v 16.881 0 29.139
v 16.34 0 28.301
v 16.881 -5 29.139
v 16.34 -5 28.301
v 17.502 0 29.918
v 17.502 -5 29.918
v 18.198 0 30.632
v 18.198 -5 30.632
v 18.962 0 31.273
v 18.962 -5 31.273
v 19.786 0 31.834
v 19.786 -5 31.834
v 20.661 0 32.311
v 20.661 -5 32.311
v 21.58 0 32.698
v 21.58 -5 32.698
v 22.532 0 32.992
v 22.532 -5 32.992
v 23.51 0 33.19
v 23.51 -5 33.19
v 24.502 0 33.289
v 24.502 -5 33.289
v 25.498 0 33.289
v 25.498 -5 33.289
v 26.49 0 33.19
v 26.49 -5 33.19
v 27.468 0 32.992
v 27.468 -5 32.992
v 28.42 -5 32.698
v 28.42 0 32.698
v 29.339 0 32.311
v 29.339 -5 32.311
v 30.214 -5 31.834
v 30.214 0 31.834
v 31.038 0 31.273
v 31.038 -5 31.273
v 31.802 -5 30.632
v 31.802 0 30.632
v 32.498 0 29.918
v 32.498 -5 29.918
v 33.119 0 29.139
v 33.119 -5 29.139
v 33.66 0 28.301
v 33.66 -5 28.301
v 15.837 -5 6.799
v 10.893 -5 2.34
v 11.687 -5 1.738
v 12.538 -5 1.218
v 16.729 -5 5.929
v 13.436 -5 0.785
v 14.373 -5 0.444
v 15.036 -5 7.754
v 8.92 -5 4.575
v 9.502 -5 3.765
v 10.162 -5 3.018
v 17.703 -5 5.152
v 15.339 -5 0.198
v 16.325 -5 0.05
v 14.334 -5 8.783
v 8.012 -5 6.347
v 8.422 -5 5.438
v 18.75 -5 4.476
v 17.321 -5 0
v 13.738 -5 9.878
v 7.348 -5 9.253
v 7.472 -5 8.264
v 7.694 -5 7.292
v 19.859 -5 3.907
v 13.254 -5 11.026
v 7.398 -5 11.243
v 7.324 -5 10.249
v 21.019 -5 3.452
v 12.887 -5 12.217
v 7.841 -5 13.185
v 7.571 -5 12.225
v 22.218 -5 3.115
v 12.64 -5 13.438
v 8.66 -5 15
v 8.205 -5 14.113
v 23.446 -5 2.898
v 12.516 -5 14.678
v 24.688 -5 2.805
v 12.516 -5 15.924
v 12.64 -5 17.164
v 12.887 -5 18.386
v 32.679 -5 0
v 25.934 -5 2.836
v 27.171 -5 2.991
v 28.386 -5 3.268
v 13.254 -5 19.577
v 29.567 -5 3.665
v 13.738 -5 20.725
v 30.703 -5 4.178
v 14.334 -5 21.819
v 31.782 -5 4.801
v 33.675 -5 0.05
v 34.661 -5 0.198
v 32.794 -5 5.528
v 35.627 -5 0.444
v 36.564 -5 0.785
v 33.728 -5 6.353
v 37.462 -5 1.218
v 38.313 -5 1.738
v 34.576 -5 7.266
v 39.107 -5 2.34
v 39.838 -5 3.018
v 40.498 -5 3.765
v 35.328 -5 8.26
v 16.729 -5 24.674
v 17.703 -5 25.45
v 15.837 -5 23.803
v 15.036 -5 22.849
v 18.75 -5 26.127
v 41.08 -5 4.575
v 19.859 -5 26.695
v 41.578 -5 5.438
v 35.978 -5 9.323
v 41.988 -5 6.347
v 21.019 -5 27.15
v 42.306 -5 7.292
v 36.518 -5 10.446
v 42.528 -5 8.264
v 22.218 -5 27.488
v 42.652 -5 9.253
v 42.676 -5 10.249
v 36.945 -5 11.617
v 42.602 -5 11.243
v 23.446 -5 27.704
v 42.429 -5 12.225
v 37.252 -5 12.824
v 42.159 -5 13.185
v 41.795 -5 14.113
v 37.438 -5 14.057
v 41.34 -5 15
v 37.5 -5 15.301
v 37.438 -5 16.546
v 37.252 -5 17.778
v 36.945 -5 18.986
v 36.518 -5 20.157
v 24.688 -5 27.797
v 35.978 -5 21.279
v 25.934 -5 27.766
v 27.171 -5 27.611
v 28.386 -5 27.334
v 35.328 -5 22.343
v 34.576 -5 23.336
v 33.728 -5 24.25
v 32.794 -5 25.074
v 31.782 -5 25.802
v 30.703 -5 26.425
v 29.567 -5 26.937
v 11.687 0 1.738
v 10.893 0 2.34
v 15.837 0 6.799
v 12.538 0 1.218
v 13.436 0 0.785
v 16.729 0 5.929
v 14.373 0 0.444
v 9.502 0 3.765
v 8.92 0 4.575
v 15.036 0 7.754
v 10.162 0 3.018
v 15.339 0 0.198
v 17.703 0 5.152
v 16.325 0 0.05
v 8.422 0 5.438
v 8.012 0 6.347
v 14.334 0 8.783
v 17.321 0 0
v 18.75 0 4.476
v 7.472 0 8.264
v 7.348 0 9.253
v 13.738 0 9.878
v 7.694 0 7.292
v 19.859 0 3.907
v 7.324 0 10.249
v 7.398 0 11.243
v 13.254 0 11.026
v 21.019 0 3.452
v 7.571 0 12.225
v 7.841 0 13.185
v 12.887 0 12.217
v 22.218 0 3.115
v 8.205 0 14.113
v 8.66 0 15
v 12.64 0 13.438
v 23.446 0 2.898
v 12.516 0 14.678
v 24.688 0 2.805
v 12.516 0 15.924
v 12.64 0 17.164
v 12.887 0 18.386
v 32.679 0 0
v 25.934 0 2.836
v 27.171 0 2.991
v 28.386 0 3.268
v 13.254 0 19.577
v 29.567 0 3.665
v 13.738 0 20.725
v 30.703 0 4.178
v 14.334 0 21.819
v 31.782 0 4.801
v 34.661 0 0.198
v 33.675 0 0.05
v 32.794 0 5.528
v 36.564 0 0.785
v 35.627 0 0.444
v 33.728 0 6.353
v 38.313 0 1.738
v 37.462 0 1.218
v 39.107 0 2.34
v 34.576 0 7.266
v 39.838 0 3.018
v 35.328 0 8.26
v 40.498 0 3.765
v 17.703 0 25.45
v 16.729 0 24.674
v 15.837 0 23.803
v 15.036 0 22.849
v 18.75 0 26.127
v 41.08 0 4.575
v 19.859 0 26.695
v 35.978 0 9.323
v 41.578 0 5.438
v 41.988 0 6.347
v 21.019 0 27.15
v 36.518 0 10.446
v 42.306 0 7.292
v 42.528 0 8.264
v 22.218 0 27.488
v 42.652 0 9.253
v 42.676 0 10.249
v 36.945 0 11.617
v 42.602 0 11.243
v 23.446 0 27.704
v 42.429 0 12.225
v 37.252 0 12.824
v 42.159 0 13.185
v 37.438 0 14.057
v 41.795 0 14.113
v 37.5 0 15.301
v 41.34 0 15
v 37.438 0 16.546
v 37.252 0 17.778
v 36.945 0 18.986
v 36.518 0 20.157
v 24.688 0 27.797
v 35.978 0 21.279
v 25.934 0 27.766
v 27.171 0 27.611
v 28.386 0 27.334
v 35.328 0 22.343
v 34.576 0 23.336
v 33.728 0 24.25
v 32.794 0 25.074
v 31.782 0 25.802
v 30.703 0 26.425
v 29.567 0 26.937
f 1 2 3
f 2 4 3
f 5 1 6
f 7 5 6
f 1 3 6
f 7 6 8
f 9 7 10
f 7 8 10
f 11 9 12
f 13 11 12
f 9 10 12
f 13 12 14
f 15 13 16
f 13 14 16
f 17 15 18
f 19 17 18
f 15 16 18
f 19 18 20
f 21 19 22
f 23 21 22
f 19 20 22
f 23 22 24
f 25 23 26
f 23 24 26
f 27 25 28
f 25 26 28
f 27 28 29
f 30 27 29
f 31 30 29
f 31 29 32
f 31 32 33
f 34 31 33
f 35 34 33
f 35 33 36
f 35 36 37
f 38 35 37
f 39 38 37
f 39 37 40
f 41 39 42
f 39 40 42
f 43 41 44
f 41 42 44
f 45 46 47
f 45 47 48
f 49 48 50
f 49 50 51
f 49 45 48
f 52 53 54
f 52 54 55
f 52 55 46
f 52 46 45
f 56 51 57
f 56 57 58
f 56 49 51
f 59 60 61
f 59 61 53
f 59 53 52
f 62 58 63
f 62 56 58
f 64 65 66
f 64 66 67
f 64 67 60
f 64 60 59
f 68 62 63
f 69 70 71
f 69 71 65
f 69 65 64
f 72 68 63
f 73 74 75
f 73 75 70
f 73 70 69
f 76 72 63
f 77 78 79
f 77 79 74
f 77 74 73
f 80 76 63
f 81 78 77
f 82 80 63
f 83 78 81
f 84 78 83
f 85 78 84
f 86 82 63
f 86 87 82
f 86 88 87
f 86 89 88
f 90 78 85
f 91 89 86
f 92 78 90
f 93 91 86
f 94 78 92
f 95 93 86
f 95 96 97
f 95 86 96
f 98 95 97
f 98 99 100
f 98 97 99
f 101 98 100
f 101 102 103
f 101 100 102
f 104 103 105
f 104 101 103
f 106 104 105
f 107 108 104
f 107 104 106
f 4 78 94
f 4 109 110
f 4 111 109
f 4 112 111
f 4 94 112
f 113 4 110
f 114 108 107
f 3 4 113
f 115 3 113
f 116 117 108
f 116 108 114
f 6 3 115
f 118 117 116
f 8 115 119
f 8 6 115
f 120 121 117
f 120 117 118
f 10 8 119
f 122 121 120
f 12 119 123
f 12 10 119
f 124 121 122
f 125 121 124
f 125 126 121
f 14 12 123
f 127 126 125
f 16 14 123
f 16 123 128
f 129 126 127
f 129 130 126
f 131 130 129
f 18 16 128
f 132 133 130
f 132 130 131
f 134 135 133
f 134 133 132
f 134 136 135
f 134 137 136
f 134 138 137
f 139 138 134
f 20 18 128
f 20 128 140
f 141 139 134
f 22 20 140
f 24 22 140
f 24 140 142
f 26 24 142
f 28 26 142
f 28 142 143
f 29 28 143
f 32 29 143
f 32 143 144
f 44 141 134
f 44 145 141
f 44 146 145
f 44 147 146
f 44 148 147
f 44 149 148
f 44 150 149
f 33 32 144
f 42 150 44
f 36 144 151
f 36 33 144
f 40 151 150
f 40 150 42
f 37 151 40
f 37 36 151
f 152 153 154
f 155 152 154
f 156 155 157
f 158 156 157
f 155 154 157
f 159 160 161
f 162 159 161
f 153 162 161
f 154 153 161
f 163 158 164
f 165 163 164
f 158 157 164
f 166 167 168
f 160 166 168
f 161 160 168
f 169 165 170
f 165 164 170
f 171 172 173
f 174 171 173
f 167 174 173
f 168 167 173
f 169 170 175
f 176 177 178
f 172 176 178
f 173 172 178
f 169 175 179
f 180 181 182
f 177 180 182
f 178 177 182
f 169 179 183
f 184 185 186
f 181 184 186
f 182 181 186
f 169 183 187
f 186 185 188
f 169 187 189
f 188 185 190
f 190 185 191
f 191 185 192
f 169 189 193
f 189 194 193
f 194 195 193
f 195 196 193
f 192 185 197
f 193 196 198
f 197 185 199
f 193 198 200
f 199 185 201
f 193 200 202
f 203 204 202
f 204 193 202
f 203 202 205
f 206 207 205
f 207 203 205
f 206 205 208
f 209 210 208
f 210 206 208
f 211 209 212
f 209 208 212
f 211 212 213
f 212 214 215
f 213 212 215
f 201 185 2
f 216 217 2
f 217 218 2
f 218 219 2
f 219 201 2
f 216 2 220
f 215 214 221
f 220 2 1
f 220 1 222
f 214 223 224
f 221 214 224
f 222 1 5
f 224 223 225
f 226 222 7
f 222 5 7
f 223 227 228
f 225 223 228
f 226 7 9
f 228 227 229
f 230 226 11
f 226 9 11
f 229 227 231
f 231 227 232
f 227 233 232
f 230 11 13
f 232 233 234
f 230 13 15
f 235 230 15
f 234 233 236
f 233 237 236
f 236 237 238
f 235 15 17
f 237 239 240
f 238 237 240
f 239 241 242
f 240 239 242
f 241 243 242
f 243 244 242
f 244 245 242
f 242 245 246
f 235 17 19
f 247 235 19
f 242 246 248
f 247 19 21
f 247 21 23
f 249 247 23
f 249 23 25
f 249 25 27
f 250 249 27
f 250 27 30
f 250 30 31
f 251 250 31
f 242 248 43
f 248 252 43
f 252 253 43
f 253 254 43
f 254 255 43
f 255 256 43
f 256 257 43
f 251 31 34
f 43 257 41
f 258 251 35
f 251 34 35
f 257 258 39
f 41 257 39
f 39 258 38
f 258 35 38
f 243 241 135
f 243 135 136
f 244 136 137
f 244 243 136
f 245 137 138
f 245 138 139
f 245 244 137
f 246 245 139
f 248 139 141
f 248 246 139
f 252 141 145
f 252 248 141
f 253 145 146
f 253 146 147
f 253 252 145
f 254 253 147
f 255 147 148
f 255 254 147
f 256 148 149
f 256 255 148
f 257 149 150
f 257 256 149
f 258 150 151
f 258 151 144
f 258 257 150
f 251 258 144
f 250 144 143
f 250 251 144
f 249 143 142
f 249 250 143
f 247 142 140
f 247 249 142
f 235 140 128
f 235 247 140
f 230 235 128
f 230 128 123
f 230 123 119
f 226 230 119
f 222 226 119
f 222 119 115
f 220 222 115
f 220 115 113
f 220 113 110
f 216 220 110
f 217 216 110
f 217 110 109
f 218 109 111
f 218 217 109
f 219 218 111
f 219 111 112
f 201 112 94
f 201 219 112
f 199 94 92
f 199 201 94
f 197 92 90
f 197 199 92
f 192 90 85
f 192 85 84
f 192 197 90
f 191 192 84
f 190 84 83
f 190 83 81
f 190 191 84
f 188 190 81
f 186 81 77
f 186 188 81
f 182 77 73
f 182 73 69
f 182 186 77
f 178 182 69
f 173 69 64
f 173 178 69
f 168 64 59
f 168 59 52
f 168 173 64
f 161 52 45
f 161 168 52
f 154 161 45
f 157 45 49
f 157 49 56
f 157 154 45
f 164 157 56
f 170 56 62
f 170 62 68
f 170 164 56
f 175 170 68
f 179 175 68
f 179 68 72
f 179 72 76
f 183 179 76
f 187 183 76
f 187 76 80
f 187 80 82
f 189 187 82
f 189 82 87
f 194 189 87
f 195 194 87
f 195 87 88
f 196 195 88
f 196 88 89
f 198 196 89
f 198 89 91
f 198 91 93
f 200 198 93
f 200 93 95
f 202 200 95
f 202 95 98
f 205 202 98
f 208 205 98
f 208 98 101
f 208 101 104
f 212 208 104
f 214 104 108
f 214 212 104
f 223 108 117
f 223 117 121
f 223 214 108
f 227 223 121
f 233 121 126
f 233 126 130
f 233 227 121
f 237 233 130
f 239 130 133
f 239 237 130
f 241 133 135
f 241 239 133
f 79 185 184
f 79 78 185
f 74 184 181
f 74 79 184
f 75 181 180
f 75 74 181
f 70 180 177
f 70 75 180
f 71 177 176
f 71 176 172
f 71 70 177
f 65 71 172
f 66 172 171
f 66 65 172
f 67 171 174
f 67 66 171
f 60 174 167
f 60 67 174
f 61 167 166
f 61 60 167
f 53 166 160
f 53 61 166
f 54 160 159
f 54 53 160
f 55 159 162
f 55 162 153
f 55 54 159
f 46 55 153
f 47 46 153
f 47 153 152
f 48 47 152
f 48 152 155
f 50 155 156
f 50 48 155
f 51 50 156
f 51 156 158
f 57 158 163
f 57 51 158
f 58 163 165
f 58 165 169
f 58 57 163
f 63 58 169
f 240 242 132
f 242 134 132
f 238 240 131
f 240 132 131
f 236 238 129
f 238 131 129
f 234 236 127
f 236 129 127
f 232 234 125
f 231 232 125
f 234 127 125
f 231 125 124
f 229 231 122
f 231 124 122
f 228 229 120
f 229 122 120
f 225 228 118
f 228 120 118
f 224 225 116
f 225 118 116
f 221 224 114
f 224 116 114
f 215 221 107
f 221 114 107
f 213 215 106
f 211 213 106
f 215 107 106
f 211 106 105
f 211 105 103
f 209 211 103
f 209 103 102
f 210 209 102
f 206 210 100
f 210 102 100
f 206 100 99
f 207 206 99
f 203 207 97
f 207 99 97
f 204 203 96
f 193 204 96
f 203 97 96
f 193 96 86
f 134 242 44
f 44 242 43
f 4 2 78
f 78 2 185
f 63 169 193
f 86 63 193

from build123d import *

# Parameters (mm, degrees)
F0_R     = 12.5
F1_DEPTH = 5
F2_R     = 10


with BuildPart() as f1:
    # F0 (on Front) → F1 (new body)
    with BuildSketch(Plane.XZ):
        Polygon((25, 43.30127), (0, 0), (50, 0), align=None)
        with Locations((25, 15.30127)):
            Circle(F0_R, mode=Mode.SUBTRACT)
    extrude(amount=F1_DEPTH)

    # F2
    f2_edges = [f1.edges().sort_by_distance(p)[0] for p in [
        (25, -2.5, 43.30127),
        (0, -2.5, 0),
        (50, -2.5, 0),
    ]]
    fillet(f2_edges, radius=F2_R)


solid = f1.part
